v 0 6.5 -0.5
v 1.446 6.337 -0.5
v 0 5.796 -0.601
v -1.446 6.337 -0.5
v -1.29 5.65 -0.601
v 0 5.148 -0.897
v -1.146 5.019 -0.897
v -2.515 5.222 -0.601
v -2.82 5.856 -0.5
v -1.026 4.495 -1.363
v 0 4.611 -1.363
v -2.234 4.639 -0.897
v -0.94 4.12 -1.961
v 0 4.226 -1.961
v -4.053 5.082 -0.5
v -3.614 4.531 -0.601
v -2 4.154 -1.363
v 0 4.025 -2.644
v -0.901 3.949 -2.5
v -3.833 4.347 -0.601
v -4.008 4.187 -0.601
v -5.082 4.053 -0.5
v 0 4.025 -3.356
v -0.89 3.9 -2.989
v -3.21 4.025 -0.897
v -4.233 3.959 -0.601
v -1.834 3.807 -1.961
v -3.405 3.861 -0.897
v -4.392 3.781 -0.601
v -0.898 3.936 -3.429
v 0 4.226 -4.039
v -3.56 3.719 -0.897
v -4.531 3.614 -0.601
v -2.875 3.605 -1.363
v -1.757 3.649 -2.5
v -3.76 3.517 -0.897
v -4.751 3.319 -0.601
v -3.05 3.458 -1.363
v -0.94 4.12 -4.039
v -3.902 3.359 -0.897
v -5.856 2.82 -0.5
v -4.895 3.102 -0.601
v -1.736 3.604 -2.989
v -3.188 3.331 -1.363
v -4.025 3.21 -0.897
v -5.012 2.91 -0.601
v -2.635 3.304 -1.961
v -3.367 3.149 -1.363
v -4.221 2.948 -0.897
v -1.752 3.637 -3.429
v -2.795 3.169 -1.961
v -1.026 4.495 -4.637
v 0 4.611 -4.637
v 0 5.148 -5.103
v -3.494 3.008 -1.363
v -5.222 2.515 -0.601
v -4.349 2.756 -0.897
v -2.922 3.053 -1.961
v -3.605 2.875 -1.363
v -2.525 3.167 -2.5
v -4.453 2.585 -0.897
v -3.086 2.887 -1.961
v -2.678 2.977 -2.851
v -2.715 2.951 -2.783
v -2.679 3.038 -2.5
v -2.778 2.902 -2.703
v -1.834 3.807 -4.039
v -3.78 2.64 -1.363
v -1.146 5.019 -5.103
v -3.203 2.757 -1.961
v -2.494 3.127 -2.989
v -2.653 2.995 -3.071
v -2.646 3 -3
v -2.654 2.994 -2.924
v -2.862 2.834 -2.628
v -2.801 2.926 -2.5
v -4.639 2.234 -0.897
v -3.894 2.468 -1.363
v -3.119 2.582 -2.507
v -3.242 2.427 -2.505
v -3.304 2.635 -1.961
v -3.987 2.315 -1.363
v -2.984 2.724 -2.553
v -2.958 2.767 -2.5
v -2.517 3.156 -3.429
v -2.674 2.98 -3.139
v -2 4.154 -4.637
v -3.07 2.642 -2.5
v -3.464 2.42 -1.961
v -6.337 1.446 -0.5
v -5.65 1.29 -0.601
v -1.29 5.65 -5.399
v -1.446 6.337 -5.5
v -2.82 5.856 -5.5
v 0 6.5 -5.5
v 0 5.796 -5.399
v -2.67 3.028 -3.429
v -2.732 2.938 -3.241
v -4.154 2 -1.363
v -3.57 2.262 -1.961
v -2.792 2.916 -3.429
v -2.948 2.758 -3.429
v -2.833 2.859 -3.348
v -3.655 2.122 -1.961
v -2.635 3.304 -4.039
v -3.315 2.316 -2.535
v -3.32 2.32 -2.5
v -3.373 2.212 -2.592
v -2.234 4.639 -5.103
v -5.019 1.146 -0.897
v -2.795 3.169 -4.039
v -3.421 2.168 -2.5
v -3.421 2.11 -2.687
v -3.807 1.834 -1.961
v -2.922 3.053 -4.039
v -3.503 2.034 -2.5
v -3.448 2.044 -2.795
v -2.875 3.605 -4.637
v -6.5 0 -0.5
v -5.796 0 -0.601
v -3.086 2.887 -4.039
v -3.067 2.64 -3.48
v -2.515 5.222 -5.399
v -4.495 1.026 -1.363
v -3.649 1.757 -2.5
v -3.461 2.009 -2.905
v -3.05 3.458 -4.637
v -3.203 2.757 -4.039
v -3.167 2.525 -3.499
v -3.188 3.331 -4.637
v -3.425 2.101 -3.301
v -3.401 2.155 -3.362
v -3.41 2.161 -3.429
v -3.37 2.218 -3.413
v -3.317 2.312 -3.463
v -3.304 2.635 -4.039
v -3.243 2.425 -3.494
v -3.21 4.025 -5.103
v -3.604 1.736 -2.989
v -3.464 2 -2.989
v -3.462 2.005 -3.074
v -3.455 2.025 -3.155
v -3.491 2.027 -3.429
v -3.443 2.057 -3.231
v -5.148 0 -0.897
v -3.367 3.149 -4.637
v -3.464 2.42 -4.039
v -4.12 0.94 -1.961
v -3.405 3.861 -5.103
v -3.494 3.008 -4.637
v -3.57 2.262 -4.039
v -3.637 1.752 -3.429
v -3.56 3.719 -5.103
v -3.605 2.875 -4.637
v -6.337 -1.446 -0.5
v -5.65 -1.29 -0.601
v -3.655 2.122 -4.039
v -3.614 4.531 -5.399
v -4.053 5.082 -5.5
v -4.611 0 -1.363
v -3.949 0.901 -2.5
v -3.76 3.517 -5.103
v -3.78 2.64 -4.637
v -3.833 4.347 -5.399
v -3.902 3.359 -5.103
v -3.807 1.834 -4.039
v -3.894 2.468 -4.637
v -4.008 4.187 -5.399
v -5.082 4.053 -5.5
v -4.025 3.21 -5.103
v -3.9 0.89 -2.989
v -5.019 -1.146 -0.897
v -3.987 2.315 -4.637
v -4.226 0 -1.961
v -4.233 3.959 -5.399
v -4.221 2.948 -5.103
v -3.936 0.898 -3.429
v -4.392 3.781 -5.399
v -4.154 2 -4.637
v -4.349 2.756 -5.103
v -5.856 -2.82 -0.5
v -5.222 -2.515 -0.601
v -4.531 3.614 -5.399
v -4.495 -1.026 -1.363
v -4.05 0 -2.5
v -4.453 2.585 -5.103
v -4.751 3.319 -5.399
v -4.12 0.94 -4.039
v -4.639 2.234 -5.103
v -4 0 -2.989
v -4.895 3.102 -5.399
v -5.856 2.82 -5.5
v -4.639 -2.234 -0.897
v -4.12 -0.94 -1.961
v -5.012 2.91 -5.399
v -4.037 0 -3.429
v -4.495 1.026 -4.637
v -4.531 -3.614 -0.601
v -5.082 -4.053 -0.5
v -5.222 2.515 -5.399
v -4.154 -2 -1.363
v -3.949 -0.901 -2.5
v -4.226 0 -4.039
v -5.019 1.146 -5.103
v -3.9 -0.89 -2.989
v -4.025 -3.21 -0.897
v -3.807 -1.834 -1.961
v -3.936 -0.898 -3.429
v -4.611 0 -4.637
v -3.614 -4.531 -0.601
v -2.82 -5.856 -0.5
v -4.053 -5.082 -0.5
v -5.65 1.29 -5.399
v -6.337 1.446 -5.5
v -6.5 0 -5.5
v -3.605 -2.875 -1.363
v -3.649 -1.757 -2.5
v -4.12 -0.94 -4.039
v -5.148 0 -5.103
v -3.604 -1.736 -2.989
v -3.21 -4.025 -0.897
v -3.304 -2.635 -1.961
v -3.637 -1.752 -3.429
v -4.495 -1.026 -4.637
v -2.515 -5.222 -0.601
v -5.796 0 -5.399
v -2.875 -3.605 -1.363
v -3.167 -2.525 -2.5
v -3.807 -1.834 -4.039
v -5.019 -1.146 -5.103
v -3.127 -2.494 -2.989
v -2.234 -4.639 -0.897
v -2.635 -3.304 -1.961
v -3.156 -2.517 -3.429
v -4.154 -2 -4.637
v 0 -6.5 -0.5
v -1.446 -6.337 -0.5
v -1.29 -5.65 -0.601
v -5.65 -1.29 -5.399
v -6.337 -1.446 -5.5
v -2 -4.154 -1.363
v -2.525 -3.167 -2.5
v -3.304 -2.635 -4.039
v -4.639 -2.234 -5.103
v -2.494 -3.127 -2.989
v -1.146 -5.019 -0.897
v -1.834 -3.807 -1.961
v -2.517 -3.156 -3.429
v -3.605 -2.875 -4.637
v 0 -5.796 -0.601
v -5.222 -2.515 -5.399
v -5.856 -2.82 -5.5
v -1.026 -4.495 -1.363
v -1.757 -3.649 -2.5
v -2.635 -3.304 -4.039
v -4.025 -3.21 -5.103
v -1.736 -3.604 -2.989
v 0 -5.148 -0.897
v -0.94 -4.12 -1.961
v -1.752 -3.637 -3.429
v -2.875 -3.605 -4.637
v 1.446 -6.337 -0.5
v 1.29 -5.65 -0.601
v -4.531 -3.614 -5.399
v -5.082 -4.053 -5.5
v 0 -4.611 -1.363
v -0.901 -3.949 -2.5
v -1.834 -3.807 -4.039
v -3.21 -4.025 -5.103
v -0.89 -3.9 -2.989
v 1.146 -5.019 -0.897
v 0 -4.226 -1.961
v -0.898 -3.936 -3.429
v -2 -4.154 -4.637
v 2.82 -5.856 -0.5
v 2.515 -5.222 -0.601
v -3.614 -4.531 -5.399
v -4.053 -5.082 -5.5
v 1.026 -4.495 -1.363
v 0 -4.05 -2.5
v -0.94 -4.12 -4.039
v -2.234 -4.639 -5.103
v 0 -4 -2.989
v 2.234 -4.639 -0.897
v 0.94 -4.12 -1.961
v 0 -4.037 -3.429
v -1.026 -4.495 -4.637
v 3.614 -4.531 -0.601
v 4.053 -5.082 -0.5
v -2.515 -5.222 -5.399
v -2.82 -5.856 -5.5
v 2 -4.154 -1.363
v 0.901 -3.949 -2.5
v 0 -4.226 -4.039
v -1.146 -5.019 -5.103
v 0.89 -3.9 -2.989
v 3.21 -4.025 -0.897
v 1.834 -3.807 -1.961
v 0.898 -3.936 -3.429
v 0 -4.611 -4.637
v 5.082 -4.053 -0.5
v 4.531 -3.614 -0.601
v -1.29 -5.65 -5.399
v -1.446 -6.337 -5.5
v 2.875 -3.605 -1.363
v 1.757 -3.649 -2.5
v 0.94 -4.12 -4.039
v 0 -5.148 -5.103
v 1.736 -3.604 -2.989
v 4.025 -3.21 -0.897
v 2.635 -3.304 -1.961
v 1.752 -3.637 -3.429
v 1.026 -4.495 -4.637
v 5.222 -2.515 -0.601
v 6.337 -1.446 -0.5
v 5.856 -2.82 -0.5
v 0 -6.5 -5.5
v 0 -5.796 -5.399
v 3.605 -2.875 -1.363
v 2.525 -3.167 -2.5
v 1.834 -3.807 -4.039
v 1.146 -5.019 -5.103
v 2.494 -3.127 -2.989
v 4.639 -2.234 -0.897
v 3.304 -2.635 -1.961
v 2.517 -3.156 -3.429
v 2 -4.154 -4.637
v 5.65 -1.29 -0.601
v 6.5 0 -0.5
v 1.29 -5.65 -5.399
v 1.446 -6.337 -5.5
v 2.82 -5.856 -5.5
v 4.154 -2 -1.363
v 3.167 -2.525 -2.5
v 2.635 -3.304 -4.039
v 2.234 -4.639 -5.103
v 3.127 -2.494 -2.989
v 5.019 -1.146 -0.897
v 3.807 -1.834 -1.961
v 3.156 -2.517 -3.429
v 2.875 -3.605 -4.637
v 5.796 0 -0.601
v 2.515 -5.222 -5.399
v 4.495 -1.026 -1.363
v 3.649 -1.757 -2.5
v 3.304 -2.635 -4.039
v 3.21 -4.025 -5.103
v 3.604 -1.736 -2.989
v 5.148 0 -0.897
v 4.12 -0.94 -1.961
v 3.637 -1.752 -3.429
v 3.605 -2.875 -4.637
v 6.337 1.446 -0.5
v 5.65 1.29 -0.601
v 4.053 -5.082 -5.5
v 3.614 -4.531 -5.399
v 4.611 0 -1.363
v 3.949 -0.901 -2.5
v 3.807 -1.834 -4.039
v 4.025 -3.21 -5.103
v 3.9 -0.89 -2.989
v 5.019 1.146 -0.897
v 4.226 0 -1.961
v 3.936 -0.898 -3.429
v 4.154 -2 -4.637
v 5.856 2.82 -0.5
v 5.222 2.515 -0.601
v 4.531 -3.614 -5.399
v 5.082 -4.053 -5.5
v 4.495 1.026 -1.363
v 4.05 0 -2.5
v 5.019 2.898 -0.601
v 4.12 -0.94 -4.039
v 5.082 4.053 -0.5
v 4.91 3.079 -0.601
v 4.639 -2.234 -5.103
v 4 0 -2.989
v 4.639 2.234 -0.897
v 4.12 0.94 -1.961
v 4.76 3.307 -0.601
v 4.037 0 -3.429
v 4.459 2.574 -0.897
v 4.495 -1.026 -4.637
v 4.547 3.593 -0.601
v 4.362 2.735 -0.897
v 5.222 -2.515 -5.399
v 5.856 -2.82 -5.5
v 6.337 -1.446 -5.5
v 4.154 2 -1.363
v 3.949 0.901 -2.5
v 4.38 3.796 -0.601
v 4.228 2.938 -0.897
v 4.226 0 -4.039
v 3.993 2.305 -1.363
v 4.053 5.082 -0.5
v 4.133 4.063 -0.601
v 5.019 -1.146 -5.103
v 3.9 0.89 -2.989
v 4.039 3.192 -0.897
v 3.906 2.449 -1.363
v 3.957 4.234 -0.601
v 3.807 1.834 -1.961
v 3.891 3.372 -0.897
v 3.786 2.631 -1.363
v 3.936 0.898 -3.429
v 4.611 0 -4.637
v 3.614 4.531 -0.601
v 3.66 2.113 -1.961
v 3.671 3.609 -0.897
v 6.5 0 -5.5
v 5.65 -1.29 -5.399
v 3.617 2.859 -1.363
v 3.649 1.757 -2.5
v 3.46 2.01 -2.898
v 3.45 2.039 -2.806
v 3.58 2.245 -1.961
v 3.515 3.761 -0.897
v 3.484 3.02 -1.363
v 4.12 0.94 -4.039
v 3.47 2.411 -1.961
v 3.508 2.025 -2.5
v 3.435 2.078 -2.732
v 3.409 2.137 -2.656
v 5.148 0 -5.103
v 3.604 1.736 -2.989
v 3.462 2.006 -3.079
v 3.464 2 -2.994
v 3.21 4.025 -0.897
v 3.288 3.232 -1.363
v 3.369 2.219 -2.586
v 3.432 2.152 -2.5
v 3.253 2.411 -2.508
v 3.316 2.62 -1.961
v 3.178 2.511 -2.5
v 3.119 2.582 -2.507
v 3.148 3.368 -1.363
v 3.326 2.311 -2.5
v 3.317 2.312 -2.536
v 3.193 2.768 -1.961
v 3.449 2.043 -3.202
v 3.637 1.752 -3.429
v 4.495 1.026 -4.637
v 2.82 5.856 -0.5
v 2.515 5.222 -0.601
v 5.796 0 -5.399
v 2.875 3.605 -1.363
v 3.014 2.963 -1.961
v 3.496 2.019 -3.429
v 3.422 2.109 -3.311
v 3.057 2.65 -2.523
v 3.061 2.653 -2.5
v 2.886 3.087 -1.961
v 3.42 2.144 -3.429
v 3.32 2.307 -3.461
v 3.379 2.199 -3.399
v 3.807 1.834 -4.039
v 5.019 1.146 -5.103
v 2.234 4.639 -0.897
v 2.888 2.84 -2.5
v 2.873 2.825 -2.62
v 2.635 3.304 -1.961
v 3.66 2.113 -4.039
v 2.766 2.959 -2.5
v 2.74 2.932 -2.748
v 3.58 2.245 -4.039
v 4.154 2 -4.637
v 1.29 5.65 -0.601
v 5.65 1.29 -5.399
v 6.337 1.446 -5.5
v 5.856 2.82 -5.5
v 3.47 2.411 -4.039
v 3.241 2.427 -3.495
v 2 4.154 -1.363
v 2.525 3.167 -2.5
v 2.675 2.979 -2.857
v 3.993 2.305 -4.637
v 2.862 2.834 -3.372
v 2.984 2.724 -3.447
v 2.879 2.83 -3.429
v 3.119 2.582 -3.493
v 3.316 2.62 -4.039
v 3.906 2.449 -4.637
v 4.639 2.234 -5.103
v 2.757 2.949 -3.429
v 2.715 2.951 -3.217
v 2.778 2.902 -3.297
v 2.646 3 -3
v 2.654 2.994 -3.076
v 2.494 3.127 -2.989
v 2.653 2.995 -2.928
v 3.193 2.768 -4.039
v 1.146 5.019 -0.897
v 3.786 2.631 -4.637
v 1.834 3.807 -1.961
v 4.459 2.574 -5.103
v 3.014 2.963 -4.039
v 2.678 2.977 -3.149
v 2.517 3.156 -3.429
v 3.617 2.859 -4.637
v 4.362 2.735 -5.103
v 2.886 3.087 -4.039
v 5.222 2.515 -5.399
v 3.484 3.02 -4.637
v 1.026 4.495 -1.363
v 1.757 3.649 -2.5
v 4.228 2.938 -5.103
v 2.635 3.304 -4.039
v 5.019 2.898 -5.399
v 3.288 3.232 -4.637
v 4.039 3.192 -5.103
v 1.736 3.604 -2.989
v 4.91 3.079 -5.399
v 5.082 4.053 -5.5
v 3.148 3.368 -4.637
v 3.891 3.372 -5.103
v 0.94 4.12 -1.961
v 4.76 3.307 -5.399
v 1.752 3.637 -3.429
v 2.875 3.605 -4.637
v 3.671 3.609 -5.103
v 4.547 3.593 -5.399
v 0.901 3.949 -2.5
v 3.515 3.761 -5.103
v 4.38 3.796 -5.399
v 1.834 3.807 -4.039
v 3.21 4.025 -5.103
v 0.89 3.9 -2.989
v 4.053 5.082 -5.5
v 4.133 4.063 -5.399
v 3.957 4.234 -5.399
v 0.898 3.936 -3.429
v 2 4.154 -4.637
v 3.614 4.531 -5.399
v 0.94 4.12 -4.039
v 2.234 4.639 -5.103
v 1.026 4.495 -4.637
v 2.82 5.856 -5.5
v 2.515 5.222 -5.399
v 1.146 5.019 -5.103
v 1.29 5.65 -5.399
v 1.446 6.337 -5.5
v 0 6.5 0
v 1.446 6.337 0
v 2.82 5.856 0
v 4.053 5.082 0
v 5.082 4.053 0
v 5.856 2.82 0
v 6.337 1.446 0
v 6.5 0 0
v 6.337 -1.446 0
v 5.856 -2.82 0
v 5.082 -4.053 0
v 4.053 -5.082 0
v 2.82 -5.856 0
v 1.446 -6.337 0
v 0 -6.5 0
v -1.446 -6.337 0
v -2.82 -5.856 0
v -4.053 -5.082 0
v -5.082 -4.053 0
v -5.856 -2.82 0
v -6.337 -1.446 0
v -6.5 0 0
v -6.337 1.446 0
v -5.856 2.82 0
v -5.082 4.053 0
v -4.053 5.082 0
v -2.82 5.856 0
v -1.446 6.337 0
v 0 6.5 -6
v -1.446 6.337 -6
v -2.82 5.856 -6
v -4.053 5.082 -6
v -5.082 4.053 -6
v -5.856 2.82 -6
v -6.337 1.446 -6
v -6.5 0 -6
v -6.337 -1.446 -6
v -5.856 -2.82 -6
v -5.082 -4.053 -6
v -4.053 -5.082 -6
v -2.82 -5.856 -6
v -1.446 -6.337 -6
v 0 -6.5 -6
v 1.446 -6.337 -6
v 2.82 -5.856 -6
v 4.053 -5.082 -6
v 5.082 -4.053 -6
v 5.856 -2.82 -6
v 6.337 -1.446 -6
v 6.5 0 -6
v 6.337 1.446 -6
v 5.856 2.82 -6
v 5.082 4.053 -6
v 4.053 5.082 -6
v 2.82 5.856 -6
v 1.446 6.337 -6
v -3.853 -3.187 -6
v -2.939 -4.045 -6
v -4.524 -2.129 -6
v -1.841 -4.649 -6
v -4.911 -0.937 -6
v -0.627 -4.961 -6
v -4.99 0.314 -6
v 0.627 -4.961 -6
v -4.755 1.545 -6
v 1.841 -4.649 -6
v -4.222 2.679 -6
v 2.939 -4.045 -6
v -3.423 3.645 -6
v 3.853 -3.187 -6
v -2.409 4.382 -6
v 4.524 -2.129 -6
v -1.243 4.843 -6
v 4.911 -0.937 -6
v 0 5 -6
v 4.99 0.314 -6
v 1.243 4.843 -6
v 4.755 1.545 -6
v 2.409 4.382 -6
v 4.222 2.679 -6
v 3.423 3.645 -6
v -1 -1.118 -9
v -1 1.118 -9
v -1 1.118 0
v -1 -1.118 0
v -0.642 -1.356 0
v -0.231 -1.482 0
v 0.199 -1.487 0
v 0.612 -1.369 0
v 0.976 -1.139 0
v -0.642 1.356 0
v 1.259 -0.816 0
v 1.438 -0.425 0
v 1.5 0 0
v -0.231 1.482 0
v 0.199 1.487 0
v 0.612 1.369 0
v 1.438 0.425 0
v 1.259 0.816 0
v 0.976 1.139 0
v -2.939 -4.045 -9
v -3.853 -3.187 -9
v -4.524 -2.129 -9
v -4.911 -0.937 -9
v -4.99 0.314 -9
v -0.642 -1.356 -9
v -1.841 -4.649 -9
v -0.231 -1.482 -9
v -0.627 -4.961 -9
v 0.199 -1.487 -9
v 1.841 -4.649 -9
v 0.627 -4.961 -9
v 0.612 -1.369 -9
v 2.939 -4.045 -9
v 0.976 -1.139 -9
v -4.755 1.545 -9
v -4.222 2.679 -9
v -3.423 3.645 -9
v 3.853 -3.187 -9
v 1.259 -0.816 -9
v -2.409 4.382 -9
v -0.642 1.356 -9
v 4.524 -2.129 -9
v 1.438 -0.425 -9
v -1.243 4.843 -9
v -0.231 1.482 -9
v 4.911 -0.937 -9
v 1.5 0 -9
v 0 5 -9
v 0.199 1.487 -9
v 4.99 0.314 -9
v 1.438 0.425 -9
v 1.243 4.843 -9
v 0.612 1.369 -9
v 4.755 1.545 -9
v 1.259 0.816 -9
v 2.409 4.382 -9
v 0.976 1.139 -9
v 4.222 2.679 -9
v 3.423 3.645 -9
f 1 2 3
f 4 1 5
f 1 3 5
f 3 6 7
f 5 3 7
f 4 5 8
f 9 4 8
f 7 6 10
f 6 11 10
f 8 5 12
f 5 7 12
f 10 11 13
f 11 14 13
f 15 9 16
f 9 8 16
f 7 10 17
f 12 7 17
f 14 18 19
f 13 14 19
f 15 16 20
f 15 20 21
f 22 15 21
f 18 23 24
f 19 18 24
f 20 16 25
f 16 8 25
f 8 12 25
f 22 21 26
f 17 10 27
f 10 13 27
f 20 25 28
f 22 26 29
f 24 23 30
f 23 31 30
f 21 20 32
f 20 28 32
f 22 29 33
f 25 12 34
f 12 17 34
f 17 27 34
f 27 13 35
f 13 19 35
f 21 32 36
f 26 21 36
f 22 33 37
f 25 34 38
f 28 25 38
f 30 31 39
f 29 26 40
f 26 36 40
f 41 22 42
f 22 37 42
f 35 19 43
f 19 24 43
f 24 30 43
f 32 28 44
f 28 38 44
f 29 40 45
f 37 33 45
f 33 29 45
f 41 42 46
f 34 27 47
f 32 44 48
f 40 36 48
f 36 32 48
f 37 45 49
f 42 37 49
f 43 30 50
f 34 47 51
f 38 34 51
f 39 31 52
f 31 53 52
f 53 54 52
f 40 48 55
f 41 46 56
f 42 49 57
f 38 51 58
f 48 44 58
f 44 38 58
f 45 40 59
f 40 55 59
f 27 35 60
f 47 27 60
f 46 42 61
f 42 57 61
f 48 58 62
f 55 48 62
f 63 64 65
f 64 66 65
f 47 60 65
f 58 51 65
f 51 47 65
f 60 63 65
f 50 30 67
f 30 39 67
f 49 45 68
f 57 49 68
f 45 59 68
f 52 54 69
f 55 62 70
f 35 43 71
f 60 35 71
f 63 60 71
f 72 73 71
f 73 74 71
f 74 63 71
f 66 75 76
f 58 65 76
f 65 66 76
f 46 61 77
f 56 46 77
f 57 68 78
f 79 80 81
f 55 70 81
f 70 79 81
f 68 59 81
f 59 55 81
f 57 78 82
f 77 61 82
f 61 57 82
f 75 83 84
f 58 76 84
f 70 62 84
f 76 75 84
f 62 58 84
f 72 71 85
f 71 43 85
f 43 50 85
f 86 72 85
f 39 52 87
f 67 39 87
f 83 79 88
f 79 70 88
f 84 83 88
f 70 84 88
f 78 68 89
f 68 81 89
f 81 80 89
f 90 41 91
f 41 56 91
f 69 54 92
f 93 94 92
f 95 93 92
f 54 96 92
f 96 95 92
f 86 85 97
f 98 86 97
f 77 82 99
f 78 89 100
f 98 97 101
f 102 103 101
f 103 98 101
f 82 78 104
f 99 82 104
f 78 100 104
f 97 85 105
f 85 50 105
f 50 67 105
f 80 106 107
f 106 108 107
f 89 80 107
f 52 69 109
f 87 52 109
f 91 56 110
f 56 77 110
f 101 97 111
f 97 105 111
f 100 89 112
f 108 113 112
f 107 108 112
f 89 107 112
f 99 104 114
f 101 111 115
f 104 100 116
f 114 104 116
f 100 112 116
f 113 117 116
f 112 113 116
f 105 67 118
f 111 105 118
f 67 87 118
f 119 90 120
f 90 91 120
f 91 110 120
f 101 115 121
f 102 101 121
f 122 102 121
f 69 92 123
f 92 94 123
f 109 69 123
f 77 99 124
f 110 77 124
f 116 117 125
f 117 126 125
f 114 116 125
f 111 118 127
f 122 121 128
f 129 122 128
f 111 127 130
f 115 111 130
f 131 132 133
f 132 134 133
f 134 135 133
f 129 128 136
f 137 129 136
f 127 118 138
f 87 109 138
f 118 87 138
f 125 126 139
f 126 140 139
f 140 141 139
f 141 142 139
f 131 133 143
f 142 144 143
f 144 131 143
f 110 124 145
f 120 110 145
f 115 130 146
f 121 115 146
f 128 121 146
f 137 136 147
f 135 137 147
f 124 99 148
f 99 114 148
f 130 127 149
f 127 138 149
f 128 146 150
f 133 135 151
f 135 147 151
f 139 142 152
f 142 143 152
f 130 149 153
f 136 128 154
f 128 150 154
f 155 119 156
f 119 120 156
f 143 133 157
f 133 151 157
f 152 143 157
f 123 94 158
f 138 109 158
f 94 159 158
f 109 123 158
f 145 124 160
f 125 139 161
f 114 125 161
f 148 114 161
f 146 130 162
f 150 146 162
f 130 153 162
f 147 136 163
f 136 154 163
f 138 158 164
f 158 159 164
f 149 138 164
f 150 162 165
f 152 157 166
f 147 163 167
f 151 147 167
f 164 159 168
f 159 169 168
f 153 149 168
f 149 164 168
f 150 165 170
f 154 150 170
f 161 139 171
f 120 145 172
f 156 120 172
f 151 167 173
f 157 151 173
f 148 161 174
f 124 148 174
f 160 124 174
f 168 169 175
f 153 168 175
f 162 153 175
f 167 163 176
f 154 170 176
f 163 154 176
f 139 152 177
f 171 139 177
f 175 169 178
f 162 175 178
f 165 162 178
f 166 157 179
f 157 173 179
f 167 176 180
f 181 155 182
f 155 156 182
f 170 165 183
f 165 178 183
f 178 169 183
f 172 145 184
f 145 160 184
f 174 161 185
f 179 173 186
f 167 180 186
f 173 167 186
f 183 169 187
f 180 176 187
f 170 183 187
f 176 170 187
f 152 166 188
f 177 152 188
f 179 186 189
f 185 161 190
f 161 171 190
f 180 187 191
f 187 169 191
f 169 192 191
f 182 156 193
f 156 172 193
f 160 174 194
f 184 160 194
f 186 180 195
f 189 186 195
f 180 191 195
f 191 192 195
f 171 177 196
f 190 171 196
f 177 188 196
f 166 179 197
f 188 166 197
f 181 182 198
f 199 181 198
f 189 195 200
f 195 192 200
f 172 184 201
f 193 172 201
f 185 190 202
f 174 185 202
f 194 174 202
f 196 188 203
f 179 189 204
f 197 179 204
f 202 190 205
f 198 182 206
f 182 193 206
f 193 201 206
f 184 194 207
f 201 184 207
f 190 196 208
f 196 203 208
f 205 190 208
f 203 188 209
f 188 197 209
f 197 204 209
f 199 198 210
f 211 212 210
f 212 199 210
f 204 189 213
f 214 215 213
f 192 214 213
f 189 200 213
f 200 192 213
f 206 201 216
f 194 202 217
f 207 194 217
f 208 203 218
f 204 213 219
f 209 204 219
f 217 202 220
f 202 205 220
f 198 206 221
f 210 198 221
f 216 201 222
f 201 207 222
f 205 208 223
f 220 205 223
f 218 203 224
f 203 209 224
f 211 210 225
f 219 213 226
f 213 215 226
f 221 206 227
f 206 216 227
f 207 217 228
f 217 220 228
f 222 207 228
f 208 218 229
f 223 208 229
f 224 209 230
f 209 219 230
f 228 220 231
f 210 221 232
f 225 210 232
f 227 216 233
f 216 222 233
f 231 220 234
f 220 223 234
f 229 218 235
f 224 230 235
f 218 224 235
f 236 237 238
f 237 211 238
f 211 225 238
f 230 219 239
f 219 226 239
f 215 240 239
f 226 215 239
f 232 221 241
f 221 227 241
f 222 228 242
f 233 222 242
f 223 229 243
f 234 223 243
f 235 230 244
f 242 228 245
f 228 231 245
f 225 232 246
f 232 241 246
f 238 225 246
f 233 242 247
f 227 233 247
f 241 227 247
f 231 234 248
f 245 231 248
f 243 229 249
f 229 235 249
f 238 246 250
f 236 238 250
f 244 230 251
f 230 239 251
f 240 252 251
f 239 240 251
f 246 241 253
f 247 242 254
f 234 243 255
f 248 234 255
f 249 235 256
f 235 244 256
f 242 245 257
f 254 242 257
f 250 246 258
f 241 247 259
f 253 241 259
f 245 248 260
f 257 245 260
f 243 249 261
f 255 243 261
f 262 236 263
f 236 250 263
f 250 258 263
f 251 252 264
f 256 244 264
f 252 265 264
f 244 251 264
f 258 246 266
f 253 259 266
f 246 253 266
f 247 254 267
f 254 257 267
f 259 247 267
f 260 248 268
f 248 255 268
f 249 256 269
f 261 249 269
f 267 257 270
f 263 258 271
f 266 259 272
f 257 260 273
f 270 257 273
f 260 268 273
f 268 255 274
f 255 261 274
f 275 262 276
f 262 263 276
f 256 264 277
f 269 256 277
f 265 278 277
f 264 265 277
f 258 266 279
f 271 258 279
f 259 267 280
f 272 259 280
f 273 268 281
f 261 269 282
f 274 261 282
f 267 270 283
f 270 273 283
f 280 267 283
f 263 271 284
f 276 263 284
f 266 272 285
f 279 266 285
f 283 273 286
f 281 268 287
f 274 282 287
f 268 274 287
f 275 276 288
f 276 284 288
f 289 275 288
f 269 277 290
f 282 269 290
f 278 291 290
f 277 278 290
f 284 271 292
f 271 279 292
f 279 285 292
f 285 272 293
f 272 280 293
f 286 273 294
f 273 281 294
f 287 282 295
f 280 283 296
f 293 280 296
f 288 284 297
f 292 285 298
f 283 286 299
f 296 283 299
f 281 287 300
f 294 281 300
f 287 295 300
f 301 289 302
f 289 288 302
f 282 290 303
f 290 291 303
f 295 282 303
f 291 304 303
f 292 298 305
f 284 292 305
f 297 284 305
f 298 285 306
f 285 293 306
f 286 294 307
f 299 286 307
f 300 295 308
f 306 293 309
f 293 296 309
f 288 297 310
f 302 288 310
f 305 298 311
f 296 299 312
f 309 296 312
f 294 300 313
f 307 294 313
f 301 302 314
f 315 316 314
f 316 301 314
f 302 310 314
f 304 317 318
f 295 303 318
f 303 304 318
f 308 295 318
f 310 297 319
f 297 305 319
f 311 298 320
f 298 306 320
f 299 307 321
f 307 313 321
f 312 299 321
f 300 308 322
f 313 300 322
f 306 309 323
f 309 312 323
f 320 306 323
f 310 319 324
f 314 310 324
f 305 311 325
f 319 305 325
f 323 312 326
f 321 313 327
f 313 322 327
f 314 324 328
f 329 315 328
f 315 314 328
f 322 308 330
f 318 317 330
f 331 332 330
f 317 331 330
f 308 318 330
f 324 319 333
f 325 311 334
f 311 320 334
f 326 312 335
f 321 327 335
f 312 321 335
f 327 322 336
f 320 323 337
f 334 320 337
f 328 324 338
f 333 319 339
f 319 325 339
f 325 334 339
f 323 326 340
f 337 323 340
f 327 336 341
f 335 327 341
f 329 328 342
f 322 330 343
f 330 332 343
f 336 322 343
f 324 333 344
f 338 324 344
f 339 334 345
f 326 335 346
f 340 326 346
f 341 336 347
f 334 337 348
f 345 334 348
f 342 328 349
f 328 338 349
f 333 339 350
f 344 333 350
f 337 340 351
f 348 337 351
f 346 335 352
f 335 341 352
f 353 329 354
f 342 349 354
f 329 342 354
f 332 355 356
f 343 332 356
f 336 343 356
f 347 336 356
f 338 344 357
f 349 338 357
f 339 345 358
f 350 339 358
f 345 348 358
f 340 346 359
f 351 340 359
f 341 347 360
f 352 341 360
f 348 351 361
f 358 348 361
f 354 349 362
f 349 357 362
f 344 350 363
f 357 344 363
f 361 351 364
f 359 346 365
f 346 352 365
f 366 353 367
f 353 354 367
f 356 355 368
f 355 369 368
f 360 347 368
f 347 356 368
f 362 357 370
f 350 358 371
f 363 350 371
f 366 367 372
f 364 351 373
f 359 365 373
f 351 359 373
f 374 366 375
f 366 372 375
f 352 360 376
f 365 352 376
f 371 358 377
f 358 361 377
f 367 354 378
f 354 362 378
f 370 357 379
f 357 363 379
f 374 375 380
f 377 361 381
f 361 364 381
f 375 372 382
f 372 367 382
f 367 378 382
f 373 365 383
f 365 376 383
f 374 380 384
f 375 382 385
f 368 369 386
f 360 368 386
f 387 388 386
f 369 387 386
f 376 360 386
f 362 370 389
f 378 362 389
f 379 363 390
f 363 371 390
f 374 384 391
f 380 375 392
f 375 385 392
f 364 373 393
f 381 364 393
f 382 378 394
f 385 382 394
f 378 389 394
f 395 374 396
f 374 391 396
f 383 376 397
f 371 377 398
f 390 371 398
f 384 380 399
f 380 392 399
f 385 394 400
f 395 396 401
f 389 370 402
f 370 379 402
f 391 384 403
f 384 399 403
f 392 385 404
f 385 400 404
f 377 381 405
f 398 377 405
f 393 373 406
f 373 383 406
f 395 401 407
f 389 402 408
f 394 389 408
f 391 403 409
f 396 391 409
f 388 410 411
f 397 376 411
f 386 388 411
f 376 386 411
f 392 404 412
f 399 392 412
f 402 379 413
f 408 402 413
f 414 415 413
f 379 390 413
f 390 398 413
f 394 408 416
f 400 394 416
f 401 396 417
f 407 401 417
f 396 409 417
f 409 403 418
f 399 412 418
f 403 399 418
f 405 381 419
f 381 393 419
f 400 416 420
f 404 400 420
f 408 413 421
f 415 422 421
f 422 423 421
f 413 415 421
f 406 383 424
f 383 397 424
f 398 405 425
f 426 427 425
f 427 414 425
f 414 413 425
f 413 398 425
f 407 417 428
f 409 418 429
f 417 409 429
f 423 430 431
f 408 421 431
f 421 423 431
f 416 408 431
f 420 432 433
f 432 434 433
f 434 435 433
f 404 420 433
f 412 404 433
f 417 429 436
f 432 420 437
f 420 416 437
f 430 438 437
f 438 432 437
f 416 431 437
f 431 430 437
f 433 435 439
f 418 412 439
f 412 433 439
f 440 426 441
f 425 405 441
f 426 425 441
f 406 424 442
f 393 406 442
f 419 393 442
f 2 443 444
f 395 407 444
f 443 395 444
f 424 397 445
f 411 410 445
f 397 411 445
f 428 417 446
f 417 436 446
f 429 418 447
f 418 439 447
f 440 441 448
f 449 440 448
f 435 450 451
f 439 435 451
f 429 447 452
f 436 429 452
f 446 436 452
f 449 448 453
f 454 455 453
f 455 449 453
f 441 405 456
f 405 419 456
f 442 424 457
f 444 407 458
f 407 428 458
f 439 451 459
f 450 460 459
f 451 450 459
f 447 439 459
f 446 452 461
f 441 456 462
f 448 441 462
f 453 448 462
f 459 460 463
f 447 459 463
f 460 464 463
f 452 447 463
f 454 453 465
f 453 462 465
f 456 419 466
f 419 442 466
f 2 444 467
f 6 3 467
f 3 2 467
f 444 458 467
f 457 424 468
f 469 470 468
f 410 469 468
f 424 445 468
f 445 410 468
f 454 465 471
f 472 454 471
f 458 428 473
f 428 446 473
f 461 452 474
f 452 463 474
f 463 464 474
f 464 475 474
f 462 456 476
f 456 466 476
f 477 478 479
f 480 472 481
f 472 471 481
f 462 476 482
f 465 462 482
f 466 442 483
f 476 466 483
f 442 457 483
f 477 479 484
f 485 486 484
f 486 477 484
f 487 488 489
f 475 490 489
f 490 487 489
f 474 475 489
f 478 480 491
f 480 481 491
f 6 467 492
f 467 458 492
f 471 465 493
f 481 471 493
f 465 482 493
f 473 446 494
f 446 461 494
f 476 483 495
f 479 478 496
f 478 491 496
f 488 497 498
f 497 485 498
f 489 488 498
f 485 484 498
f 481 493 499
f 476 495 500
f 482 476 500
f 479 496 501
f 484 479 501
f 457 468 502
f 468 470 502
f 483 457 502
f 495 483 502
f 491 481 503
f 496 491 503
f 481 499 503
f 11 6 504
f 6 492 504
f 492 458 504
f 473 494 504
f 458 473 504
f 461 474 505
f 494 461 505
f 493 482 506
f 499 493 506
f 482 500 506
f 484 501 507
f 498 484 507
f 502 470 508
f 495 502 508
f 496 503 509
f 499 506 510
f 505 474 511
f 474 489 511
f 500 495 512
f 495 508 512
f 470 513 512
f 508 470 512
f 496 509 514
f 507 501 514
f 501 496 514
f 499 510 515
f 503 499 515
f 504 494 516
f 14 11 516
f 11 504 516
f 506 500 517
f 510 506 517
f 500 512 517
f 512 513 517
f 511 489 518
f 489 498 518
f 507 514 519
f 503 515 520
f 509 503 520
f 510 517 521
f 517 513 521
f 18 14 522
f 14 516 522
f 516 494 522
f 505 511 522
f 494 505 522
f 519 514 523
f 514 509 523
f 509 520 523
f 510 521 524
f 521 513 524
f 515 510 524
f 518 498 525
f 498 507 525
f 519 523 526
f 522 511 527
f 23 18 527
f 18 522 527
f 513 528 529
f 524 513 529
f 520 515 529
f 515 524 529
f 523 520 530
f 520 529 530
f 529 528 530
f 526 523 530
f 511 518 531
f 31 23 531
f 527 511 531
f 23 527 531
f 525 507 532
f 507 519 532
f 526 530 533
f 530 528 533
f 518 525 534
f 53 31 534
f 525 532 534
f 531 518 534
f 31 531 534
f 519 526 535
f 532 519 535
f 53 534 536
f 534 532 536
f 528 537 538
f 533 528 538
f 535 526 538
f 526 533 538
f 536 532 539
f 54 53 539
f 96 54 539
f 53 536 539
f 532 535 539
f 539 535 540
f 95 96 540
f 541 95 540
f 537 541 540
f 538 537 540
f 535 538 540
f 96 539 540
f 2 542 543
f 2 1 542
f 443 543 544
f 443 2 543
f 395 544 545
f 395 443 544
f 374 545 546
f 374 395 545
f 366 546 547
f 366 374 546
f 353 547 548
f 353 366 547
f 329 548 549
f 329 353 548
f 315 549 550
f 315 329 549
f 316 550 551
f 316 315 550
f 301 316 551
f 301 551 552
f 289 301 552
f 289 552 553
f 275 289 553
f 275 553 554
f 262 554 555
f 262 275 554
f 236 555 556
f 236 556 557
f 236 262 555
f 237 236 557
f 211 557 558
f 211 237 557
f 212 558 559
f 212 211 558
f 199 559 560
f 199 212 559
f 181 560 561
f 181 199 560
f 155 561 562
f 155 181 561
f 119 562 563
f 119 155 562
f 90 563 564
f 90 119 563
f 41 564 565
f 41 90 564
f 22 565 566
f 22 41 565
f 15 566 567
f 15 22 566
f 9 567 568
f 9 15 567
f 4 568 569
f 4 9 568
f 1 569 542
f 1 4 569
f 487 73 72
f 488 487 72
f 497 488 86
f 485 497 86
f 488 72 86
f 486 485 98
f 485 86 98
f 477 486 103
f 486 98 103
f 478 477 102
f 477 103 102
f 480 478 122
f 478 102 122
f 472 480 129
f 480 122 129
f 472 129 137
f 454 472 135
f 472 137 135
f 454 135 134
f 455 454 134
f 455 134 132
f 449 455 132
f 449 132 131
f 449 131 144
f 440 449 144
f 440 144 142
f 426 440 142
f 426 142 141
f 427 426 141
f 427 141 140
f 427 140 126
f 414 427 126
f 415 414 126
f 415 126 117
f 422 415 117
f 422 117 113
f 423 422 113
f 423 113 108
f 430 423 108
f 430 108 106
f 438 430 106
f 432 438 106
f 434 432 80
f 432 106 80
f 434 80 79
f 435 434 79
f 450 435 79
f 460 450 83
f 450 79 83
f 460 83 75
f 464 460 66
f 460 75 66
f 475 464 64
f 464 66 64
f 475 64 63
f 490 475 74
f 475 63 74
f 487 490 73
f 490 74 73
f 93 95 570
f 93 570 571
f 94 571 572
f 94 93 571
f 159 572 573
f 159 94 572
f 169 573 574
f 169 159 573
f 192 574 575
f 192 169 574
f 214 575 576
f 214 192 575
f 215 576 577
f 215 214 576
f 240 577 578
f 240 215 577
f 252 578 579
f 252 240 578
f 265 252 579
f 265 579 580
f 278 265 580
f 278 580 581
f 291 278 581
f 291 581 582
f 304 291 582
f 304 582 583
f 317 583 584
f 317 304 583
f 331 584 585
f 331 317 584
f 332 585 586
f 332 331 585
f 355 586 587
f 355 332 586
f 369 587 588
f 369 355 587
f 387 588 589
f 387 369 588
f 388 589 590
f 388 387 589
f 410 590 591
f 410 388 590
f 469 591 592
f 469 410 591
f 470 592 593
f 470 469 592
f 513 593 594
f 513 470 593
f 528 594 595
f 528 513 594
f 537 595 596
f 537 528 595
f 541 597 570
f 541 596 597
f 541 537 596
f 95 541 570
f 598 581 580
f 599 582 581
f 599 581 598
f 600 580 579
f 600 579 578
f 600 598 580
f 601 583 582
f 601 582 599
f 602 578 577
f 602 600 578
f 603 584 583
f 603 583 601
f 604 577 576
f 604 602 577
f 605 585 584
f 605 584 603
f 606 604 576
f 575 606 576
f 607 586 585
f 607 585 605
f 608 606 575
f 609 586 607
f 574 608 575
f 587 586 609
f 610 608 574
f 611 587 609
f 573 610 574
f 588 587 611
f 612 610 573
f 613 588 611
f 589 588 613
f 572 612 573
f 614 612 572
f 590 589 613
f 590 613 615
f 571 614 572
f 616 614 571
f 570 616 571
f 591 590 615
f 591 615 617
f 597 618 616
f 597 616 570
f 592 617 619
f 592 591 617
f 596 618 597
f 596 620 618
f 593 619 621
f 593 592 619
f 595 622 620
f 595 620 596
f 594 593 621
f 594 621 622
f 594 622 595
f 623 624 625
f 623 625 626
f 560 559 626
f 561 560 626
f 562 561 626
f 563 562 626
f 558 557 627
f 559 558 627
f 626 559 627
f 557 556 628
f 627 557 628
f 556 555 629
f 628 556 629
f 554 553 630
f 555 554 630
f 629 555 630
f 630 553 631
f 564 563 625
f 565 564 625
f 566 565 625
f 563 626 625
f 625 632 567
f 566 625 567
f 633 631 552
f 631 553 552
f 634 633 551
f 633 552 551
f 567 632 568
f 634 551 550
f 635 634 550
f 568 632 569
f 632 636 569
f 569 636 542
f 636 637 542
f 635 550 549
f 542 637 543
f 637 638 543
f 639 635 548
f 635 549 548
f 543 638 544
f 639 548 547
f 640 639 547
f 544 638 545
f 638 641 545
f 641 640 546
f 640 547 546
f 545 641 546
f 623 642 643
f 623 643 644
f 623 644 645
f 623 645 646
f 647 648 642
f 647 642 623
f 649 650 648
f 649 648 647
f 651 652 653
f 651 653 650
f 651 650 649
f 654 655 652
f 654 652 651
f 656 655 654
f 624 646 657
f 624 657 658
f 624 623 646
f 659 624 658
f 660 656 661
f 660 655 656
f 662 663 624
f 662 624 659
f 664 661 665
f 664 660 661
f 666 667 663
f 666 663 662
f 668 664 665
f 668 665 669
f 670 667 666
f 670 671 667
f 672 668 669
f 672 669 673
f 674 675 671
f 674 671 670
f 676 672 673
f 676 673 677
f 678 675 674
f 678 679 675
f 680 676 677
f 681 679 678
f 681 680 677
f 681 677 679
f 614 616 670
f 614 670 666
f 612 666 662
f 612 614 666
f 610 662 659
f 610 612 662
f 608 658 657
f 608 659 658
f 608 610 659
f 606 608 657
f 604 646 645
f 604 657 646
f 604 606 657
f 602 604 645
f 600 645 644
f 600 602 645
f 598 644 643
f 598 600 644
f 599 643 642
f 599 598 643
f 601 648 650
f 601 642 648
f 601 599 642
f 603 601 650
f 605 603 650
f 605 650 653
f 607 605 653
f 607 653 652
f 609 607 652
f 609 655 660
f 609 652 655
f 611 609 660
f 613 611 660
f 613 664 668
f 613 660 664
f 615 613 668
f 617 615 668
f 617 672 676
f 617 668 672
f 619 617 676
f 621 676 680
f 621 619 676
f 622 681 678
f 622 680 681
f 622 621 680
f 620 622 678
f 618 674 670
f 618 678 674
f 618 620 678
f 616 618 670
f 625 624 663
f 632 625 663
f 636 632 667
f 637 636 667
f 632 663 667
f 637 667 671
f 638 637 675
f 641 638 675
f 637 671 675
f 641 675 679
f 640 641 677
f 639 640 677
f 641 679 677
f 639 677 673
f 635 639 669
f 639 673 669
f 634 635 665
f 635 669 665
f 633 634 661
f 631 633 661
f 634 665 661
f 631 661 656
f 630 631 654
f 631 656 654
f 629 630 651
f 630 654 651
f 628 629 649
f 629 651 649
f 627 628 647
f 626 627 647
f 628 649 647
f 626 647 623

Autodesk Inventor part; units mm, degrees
ref_plane "YZ Plane" through (0, 0, 0) normal (1, 0, 0) x (0, 1, 0)
ref_plane "XZ Plane" through (0, 0, 0) normal (0, 1, 0) x (-1, 0, 0)
sketch "스케치1" plane through (0, 0, 0) normal (1, 0, 0) x (0, 1, 0)
  line L0 (0, 0) -> (0, -9)
  line L1 (0, 0) -> (1.5, 0)
  line L2 (1.5, 0) -> (1.5, -9)
  line L3 (1.5, -9) -> (5, -9)
  line L4 (5, -9) -> (5, -6)
  line L5 (5, -6) -> (6.5, -6)
  line L6 (1.5, 0) -> (6.5, 0)
  line L7 (6.5, 0) -> (6.5, -0.5)
  line L8 (6.5, -3) -> (1.5, -3) construction
  line L9 (6.5, -6) -> (6.5, -5.5)
  arc A0 (6.5, -0.5) -> (6.5, -5.5) centre (6.5, -3) ccw
  dimension "d0" = 9
  dimension "d2" = 9
  dimension "d3" = 3
  dimension "d4" = 10
  dimension "d6" = 3
  dimension "d7" = 3
  dimension "d8" = 13
  dimension "d9" = 0.5
  dimension "d10" = 0.5
  dimension "d11" = 13
revolve "회전1" add sketch "스케치1" angle 360 about axis through (0, 0, 0) along (0, 0, -1)
sketch "스케치2" plane through (0, 0, -9) normal (0, 0, -1) x (-1, 0, 0)
  circle A0 centre (0, 0) radius 1.5 projected
  line L0 (1, 1.118) -> (1, -1.118)
  dimension "d13" = 1
extrude "돌출1" add sketch "스케치2" against normal blind 9 contours A0 L0 picked at (1.1667, 0)
ref_plane "작업 평면1" through (0, 0, -3) normal (0, 0, 1) x (1, 0, 0)
sketch "스케치3" plane through (0, 0, -3) normal (0, 0, 1) x (1, 0, 0)
  line L0 (3.0429, 2.5) -> (-2.6844, 2.5)
  line L1 (-5.7069, 2.5) -> (4.2931, 2.5)
  line L2 (4.2931, 2.5) -> (4.2931, 3)
  line L3 (4.2931, 3) -> (-5.7069, 3)
  line L4 (-5.7069, 3) -> (-5.7069, 2.5)
  point P0 (0, 0)
  dimension "d16" = 0.5
  dimension "d17" = 2.5
  dimension "d18" = 10
revolve "회전2" cut sketch "스케치3" angle 360 about axis through (-5.7069, 2.5, -3) along (1, 0, 0)
properties part number "지름 핸들러"
